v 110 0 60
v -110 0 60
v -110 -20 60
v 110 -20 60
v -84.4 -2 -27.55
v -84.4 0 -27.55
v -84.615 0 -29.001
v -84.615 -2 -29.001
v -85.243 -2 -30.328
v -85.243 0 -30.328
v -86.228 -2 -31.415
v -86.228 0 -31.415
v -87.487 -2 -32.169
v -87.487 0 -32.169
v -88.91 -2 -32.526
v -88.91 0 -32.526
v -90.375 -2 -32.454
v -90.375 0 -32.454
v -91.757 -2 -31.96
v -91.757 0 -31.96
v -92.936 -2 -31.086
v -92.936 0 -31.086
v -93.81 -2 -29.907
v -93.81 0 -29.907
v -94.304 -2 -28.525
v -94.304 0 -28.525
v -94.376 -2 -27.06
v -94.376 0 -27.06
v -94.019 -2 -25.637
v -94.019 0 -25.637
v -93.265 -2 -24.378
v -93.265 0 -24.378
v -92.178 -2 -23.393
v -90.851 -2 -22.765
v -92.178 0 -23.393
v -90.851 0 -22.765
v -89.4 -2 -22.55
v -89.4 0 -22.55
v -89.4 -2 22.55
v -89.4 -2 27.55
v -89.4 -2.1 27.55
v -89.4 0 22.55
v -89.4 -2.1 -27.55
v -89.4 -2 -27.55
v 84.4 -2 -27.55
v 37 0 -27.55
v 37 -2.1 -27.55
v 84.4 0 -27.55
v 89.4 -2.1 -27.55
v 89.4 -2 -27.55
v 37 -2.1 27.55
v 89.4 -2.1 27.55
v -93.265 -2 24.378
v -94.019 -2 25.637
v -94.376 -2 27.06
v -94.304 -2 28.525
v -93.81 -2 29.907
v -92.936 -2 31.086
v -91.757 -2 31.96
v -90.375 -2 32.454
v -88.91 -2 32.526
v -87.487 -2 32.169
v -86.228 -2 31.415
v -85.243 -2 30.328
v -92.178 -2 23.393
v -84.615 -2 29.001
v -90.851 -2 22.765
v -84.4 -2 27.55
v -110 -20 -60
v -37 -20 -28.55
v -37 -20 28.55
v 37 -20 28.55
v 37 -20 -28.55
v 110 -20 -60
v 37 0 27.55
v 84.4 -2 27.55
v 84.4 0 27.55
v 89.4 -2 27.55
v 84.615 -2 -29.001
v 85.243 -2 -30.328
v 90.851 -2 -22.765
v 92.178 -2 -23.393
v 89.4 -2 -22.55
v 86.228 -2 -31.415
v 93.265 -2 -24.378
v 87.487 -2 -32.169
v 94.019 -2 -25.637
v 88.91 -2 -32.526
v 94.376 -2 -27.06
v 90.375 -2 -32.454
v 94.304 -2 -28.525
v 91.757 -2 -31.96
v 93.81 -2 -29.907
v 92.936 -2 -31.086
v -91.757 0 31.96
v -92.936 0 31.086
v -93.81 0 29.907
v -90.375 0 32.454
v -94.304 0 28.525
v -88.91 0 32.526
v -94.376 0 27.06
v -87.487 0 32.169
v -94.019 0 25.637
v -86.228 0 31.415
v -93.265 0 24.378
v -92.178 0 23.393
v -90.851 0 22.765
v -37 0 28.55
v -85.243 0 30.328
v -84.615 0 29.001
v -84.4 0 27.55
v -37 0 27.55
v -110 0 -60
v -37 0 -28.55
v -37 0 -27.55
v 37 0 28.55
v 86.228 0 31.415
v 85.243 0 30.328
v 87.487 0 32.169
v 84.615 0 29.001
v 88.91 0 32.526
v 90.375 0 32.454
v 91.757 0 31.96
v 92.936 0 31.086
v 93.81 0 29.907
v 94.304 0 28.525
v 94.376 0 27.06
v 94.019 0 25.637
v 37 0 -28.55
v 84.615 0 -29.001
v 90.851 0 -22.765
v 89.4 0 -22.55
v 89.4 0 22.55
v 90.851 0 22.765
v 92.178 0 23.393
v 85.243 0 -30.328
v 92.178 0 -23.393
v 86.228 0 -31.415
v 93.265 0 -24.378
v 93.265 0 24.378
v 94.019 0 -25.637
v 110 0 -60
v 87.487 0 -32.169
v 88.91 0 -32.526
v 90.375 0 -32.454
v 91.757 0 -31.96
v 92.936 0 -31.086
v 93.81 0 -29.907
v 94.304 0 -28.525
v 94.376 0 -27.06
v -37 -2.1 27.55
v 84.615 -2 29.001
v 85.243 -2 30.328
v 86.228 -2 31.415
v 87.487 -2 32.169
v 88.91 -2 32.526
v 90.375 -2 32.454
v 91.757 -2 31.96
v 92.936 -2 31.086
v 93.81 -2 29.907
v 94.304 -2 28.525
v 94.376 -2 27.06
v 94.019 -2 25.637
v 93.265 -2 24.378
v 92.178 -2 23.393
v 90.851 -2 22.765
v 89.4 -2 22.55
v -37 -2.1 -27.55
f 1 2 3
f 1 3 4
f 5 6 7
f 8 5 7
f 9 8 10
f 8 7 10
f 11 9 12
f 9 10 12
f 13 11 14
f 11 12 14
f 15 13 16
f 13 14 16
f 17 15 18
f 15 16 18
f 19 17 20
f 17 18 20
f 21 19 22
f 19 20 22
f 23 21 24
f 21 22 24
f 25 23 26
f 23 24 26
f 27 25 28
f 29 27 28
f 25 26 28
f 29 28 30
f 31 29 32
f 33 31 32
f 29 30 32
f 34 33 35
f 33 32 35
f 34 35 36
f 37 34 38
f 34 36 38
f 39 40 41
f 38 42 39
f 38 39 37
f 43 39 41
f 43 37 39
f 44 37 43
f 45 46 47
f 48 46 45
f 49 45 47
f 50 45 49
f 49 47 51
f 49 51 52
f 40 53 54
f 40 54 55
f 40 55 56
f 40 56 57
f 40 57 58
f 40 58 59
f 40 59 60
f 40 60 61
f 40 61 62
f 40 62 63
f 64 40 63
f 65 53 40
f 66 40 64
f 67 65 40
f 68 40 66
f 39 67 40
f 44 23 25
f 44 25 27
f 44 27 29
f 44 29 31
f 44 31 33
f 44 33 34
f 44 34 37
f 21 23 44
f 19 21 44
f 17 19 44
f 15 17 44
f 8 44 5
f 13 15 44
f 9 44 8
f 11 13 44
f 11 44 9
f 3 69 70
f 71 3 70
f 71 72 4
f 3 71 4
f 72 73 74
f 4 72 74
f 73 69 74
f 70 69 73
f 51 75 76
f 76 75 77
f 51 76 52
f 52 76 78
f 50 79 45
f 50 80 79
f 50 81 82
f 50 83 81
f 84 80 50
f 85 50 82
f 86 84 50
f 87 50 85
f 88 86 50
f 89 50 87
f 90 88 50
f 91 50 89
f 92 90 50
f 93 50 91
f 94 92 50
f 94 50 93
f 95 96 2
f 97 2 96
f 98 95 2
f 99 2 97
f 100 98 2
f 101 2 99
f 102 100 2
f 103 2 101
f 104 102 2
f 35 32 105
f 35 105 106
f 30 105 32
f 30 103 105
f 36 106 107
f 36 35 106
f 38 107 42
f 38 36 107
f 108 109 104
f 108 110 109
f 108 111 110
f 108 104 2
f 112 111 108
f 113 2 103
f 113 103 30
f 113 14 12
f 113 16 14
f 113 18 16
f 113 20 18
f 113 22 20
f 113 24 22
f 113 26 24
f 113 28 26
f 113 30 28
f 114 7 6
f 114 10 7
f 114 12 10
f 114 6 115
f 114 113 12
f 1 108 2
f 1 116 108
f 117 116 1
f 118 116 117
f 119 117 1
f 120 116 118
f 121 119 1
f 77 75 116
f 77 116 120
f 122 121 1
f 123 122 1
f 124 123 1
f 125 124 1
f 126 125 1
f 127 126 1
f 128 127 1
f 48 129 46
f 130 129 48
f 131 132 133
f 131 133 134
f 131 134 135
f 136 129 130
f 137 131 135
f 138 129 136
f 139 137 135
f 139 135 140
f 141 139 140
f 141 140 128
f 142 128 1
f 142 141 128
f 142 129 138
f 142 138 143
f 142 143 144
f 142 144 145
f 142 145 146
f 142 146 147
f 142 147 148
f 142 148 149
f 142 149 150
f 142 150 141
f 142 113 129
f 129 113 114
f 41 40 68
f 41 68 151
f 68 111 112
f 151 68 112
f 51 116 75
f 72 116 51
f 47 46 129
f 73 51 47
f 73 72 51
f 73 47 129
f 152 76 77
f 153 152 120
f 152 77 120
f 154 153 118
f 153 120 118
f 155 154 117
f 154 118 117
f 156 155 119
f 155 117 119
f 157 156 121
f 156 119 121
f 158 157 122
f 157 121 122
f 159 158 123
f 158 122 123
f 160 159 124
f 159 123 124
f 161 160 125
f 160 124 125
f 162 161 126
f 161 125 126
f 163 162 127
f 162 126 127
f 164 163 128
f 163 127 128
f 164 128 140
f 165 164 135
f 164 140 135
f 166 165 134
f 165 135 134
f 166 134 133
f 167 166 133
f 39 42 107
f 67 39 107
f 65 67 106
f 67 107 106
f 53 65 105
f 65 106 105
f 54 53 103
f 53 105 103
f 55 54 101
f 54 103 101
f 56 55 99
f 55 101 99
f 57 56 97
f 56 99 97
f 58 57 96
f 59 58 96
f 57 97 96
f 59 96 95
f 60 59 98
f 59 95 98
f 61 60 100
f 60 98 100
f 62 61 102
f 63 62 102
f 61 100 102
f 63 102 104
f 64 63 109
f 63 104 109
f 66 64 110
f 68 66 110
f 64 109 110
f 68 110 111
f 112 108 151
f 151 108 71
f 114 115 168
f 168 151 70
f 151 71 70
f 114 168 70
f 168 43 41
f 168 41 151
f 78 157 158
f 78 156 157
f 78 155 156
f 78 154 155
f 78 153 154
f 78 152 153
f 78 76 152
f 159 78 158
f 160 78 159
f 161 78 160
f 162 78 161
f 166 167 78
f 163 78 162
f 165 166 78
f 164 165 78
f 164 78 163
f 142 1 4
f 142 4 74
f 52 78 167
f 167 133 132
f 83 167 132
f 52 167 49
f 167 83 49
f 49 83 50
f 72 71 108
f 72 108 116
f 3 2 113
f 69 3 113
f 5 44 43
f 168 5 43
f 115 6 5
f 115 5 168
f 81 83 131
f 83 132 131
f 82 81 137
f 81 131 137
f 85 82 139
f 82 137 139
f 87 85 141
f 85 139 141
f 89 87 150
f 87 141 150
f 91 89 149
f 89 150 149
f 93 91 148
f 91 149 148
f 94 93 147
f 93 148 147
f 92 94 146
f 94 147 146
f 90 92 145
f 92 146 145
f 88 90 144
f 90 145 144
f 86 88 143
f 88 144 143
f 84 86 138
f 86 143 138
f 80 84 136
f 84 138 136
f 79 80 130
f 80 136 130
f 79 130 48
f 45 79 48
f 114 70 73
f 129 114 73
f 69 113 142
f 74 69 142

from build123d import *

# Parameters (mm, degrees)
SKETCH1_W               = 220
SKETCH1_H               = 120
BOSS_EXTRUDE1_DEPTH     = 20
SKETCH2_W               = 178.8
SKETCH2_H               = 55.1
CUT_EXTRUDE1_DEPTH      = 2.1
SKETCH3_R               = 5
CUT_EXTRUDE2_DEPTH      = 2
CUT_EXTRUDE3_DEPTH      = 127.571758303
CUT_EXTRUDE3_DEPTH_BACK = 127.571758303
SKETCH4_W               = 74
SKETCH4_H               = 57.1


with BuildPart() as part:
    # Sketch1 → Boss-Extrude1 (new body)
    with BuildSketch(Plane(origin=(0, 0, 0), x_dir=(1, 0, 0), z_dir=(0, 1, 0))):
        Rectangle(SKETCH1_W, SKETCH1_H)
    extrude(amount=-BOSS_EXTRUDE1_DEPTH)

    # Sketch2 → Cut-Extrude1 (cut)
    with BuildSketch(Plane(origin=(0, 0, 0), x_dir=(1, 0, 0), z_dir=(0, 1, 0))):
        Rectangle(SKETCH2_W, SKETCH2_H)
    extrude(amount=-CUT_EXTRUDE1_DEPTH, mode=Mode.SUBTRACT)

    # Sketch3 → Cut-Extrude2 (cut)
    with BuildSketch(Plane(origin=(0, 0, 0), x_dir=(1, 0, 0), z_dir=(0, 1, 0))):
        with Locations((-89.4, 27.55)):
            Circle(SKETCH3_R)
        with Locations((89.4, 27.55)):
            Circle(SKETCH3_R)
        with Locations((89.4, -27.55)):
            Circle(SKETCH3_R)
        with Locations((-89.4, -27.55)):
            Circle(SKETCH3_R)
    extrude(amount=-CUT_EXTRUDE2_DEPTH, mode=Mode.SUBTRACT)

    # Sketch4 → Cut-Extrude3 (cut, two sides: drawn at the far end of the back side and taken through both)
    with BuildSketch(Plane(origin=(0, -2.1, 0), x_dir=(1, 0, 0), z_dir=(0, 1, 0)).offset(-CUT_EXTRUDE3_DEPTH_BACK)):
        Rectangle(SKETCH4_W, SKETCH4_H)
    extrude(amount=CUT_EXTRUDE3_DEPTH + CUT_EXTRUDE3_DEPTH_BACK, mode=Mode.SUBTRACT)


solid = part.part
